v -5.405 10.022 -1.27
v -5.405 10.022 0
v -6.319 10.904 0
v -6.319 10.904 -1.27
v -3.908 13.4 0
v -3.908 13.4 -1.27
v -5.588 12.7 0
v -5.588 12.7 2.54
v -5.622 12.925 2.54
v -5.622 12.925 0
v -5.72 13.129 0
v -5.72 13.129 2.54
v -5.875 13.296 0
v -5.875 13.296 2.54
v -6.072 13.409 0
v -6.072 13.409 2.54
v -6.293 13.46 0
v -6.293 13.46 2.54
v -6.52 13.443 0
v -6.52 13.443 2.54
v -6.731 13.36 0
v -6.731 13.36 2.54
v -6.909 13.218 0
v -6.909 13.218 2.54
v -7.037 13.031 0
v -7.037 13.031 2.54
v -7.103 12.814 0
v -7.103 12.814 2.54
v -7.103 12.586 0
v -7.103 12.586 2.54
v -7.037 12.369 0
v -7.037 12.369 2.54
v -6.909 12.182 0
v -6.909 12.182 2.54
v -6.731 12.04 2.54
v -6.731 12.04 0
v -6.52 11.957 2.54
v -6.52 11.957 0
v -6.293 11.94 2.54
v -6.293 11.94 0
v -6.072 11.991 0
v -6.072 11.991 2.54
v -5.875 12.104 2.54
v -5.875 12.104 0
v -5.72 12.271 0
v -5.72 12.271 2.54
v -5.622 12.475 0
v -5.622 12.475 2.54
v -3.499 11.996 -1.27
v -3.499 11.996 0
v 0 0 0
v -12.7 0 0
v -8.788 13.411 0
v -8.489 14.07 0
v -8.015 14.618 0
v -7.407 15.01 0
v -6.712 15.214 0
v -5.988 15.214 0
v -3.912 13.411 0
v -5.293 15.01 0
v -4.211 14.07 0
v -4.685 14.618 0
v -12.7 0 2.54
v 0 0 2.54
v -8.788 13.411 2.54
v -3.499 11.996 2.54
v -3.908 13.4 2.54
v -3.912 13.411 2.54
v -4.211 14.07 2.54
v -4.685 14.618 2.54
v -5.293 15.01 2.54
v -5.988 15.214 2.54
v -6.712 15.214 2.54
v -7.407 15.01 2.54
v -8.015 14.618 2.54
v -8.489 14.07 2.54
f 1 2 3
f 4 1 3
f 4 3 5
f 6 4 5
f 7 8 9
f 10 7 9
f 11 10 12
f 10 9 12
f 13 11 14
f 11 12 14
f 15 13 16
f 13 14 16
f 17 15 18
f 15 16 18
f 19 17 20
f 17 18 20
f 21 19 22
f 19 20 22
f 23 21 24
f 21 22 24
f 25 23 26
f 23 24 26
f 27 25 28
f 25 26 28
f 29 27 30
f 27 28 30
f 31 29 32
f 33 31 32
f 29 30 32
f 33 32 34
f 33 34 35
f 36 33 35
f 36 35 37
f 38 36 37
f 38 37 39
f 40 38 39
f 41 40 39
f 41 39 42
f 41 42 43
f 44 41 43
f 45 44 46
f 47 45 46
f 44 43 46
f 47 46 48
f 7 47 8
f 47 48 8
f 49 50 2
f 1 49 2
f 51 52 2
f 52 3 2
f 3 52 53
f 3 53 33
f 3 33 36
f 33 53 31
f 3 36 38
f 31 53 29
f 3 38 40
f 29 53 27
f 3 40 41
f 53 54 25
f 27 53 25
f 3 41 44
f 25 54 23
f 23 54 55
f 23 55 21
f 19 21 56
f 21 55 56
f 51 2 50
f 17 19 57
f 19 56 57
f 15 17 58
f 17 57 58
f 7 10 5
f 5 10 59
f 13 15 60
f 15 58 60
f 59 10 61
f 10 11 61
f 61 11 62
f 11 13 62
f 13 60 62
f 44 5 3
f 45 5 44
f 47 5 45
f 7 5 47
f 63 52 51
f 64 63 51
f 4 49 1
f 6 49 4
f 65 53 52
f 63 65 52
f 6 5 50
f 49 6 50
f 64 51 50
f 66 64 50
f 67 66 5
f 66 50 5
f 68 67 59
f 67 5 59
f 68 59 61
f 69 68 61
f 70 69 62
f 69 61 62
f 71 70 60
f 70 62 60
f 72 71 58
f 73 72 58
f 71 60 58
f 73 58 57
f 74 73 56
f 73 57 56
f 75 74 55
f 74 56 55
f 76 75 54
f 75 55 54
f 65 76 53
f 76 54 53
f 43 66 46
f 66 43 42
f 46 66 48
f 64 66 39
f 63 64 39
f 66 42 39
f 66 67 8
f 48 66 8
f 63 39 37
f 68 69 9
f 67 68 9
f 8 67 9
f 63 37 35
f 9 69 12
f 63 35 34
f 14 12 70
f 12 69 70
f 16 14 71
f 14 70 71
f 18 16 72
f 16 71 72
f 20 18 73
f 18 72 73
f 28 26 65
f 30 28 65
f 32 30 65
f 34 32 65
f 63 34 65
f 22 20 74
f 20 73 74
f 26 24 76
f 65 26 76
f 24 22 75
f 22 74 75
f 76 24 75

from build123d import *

# Parameters (mm, degrees)
BOSS_EXTRUDE1_DEPTH = 2.54
BOSS_EXTRUDE2_DEPTH = 3.81
SKETCH3_R           = 0.762
CUT_EXTRUDE1_DEPTH  = 2.54


with BuildPart() as part:
    # Sketch1 → Boss-Extrude1 (new body)
    with BuildSketch(Plane.XY):
        with BuildLine():
            Line((-8.7884, 13.4112), (-12.7, 0))
            Line((-12.7, 0), (0, 0))
            Line((0, 0), (-3.9116, 13.4112))
            ThreePointArc((-3.9116, 13.4112), (-6.35, 15.24), (-8.7884, 13.4112))
        make_face()
    extrude(amount=BOSS_EXTRUDE1_DEPTH)

    # Sketch5 → Boss-Extrude2 (add)
    with BuildSketch(Plane.XY.offset(2.54)):
        Polygon((-6.318654584, 10.904222323), (-3.908374337, 13.400140584), (-3.498832415, 11.995996853), (-5.405093038, 10.022006193), align=None)
    extrude(amount=-BOSS_EXTRUDE2_DEPTH)

    # Sketch3 → Cut-Extrude1 (cut)
    with BuildSketch(Plane.XY.offset(2.54)):
        with Locations((-6.35, 12.7)):
            Circle(SKETCH3_R)
    extrude(amount=-CUT_EXTRUDE1_DEPTH, mode=Mode.SUBTRACT)


solid = part.part
